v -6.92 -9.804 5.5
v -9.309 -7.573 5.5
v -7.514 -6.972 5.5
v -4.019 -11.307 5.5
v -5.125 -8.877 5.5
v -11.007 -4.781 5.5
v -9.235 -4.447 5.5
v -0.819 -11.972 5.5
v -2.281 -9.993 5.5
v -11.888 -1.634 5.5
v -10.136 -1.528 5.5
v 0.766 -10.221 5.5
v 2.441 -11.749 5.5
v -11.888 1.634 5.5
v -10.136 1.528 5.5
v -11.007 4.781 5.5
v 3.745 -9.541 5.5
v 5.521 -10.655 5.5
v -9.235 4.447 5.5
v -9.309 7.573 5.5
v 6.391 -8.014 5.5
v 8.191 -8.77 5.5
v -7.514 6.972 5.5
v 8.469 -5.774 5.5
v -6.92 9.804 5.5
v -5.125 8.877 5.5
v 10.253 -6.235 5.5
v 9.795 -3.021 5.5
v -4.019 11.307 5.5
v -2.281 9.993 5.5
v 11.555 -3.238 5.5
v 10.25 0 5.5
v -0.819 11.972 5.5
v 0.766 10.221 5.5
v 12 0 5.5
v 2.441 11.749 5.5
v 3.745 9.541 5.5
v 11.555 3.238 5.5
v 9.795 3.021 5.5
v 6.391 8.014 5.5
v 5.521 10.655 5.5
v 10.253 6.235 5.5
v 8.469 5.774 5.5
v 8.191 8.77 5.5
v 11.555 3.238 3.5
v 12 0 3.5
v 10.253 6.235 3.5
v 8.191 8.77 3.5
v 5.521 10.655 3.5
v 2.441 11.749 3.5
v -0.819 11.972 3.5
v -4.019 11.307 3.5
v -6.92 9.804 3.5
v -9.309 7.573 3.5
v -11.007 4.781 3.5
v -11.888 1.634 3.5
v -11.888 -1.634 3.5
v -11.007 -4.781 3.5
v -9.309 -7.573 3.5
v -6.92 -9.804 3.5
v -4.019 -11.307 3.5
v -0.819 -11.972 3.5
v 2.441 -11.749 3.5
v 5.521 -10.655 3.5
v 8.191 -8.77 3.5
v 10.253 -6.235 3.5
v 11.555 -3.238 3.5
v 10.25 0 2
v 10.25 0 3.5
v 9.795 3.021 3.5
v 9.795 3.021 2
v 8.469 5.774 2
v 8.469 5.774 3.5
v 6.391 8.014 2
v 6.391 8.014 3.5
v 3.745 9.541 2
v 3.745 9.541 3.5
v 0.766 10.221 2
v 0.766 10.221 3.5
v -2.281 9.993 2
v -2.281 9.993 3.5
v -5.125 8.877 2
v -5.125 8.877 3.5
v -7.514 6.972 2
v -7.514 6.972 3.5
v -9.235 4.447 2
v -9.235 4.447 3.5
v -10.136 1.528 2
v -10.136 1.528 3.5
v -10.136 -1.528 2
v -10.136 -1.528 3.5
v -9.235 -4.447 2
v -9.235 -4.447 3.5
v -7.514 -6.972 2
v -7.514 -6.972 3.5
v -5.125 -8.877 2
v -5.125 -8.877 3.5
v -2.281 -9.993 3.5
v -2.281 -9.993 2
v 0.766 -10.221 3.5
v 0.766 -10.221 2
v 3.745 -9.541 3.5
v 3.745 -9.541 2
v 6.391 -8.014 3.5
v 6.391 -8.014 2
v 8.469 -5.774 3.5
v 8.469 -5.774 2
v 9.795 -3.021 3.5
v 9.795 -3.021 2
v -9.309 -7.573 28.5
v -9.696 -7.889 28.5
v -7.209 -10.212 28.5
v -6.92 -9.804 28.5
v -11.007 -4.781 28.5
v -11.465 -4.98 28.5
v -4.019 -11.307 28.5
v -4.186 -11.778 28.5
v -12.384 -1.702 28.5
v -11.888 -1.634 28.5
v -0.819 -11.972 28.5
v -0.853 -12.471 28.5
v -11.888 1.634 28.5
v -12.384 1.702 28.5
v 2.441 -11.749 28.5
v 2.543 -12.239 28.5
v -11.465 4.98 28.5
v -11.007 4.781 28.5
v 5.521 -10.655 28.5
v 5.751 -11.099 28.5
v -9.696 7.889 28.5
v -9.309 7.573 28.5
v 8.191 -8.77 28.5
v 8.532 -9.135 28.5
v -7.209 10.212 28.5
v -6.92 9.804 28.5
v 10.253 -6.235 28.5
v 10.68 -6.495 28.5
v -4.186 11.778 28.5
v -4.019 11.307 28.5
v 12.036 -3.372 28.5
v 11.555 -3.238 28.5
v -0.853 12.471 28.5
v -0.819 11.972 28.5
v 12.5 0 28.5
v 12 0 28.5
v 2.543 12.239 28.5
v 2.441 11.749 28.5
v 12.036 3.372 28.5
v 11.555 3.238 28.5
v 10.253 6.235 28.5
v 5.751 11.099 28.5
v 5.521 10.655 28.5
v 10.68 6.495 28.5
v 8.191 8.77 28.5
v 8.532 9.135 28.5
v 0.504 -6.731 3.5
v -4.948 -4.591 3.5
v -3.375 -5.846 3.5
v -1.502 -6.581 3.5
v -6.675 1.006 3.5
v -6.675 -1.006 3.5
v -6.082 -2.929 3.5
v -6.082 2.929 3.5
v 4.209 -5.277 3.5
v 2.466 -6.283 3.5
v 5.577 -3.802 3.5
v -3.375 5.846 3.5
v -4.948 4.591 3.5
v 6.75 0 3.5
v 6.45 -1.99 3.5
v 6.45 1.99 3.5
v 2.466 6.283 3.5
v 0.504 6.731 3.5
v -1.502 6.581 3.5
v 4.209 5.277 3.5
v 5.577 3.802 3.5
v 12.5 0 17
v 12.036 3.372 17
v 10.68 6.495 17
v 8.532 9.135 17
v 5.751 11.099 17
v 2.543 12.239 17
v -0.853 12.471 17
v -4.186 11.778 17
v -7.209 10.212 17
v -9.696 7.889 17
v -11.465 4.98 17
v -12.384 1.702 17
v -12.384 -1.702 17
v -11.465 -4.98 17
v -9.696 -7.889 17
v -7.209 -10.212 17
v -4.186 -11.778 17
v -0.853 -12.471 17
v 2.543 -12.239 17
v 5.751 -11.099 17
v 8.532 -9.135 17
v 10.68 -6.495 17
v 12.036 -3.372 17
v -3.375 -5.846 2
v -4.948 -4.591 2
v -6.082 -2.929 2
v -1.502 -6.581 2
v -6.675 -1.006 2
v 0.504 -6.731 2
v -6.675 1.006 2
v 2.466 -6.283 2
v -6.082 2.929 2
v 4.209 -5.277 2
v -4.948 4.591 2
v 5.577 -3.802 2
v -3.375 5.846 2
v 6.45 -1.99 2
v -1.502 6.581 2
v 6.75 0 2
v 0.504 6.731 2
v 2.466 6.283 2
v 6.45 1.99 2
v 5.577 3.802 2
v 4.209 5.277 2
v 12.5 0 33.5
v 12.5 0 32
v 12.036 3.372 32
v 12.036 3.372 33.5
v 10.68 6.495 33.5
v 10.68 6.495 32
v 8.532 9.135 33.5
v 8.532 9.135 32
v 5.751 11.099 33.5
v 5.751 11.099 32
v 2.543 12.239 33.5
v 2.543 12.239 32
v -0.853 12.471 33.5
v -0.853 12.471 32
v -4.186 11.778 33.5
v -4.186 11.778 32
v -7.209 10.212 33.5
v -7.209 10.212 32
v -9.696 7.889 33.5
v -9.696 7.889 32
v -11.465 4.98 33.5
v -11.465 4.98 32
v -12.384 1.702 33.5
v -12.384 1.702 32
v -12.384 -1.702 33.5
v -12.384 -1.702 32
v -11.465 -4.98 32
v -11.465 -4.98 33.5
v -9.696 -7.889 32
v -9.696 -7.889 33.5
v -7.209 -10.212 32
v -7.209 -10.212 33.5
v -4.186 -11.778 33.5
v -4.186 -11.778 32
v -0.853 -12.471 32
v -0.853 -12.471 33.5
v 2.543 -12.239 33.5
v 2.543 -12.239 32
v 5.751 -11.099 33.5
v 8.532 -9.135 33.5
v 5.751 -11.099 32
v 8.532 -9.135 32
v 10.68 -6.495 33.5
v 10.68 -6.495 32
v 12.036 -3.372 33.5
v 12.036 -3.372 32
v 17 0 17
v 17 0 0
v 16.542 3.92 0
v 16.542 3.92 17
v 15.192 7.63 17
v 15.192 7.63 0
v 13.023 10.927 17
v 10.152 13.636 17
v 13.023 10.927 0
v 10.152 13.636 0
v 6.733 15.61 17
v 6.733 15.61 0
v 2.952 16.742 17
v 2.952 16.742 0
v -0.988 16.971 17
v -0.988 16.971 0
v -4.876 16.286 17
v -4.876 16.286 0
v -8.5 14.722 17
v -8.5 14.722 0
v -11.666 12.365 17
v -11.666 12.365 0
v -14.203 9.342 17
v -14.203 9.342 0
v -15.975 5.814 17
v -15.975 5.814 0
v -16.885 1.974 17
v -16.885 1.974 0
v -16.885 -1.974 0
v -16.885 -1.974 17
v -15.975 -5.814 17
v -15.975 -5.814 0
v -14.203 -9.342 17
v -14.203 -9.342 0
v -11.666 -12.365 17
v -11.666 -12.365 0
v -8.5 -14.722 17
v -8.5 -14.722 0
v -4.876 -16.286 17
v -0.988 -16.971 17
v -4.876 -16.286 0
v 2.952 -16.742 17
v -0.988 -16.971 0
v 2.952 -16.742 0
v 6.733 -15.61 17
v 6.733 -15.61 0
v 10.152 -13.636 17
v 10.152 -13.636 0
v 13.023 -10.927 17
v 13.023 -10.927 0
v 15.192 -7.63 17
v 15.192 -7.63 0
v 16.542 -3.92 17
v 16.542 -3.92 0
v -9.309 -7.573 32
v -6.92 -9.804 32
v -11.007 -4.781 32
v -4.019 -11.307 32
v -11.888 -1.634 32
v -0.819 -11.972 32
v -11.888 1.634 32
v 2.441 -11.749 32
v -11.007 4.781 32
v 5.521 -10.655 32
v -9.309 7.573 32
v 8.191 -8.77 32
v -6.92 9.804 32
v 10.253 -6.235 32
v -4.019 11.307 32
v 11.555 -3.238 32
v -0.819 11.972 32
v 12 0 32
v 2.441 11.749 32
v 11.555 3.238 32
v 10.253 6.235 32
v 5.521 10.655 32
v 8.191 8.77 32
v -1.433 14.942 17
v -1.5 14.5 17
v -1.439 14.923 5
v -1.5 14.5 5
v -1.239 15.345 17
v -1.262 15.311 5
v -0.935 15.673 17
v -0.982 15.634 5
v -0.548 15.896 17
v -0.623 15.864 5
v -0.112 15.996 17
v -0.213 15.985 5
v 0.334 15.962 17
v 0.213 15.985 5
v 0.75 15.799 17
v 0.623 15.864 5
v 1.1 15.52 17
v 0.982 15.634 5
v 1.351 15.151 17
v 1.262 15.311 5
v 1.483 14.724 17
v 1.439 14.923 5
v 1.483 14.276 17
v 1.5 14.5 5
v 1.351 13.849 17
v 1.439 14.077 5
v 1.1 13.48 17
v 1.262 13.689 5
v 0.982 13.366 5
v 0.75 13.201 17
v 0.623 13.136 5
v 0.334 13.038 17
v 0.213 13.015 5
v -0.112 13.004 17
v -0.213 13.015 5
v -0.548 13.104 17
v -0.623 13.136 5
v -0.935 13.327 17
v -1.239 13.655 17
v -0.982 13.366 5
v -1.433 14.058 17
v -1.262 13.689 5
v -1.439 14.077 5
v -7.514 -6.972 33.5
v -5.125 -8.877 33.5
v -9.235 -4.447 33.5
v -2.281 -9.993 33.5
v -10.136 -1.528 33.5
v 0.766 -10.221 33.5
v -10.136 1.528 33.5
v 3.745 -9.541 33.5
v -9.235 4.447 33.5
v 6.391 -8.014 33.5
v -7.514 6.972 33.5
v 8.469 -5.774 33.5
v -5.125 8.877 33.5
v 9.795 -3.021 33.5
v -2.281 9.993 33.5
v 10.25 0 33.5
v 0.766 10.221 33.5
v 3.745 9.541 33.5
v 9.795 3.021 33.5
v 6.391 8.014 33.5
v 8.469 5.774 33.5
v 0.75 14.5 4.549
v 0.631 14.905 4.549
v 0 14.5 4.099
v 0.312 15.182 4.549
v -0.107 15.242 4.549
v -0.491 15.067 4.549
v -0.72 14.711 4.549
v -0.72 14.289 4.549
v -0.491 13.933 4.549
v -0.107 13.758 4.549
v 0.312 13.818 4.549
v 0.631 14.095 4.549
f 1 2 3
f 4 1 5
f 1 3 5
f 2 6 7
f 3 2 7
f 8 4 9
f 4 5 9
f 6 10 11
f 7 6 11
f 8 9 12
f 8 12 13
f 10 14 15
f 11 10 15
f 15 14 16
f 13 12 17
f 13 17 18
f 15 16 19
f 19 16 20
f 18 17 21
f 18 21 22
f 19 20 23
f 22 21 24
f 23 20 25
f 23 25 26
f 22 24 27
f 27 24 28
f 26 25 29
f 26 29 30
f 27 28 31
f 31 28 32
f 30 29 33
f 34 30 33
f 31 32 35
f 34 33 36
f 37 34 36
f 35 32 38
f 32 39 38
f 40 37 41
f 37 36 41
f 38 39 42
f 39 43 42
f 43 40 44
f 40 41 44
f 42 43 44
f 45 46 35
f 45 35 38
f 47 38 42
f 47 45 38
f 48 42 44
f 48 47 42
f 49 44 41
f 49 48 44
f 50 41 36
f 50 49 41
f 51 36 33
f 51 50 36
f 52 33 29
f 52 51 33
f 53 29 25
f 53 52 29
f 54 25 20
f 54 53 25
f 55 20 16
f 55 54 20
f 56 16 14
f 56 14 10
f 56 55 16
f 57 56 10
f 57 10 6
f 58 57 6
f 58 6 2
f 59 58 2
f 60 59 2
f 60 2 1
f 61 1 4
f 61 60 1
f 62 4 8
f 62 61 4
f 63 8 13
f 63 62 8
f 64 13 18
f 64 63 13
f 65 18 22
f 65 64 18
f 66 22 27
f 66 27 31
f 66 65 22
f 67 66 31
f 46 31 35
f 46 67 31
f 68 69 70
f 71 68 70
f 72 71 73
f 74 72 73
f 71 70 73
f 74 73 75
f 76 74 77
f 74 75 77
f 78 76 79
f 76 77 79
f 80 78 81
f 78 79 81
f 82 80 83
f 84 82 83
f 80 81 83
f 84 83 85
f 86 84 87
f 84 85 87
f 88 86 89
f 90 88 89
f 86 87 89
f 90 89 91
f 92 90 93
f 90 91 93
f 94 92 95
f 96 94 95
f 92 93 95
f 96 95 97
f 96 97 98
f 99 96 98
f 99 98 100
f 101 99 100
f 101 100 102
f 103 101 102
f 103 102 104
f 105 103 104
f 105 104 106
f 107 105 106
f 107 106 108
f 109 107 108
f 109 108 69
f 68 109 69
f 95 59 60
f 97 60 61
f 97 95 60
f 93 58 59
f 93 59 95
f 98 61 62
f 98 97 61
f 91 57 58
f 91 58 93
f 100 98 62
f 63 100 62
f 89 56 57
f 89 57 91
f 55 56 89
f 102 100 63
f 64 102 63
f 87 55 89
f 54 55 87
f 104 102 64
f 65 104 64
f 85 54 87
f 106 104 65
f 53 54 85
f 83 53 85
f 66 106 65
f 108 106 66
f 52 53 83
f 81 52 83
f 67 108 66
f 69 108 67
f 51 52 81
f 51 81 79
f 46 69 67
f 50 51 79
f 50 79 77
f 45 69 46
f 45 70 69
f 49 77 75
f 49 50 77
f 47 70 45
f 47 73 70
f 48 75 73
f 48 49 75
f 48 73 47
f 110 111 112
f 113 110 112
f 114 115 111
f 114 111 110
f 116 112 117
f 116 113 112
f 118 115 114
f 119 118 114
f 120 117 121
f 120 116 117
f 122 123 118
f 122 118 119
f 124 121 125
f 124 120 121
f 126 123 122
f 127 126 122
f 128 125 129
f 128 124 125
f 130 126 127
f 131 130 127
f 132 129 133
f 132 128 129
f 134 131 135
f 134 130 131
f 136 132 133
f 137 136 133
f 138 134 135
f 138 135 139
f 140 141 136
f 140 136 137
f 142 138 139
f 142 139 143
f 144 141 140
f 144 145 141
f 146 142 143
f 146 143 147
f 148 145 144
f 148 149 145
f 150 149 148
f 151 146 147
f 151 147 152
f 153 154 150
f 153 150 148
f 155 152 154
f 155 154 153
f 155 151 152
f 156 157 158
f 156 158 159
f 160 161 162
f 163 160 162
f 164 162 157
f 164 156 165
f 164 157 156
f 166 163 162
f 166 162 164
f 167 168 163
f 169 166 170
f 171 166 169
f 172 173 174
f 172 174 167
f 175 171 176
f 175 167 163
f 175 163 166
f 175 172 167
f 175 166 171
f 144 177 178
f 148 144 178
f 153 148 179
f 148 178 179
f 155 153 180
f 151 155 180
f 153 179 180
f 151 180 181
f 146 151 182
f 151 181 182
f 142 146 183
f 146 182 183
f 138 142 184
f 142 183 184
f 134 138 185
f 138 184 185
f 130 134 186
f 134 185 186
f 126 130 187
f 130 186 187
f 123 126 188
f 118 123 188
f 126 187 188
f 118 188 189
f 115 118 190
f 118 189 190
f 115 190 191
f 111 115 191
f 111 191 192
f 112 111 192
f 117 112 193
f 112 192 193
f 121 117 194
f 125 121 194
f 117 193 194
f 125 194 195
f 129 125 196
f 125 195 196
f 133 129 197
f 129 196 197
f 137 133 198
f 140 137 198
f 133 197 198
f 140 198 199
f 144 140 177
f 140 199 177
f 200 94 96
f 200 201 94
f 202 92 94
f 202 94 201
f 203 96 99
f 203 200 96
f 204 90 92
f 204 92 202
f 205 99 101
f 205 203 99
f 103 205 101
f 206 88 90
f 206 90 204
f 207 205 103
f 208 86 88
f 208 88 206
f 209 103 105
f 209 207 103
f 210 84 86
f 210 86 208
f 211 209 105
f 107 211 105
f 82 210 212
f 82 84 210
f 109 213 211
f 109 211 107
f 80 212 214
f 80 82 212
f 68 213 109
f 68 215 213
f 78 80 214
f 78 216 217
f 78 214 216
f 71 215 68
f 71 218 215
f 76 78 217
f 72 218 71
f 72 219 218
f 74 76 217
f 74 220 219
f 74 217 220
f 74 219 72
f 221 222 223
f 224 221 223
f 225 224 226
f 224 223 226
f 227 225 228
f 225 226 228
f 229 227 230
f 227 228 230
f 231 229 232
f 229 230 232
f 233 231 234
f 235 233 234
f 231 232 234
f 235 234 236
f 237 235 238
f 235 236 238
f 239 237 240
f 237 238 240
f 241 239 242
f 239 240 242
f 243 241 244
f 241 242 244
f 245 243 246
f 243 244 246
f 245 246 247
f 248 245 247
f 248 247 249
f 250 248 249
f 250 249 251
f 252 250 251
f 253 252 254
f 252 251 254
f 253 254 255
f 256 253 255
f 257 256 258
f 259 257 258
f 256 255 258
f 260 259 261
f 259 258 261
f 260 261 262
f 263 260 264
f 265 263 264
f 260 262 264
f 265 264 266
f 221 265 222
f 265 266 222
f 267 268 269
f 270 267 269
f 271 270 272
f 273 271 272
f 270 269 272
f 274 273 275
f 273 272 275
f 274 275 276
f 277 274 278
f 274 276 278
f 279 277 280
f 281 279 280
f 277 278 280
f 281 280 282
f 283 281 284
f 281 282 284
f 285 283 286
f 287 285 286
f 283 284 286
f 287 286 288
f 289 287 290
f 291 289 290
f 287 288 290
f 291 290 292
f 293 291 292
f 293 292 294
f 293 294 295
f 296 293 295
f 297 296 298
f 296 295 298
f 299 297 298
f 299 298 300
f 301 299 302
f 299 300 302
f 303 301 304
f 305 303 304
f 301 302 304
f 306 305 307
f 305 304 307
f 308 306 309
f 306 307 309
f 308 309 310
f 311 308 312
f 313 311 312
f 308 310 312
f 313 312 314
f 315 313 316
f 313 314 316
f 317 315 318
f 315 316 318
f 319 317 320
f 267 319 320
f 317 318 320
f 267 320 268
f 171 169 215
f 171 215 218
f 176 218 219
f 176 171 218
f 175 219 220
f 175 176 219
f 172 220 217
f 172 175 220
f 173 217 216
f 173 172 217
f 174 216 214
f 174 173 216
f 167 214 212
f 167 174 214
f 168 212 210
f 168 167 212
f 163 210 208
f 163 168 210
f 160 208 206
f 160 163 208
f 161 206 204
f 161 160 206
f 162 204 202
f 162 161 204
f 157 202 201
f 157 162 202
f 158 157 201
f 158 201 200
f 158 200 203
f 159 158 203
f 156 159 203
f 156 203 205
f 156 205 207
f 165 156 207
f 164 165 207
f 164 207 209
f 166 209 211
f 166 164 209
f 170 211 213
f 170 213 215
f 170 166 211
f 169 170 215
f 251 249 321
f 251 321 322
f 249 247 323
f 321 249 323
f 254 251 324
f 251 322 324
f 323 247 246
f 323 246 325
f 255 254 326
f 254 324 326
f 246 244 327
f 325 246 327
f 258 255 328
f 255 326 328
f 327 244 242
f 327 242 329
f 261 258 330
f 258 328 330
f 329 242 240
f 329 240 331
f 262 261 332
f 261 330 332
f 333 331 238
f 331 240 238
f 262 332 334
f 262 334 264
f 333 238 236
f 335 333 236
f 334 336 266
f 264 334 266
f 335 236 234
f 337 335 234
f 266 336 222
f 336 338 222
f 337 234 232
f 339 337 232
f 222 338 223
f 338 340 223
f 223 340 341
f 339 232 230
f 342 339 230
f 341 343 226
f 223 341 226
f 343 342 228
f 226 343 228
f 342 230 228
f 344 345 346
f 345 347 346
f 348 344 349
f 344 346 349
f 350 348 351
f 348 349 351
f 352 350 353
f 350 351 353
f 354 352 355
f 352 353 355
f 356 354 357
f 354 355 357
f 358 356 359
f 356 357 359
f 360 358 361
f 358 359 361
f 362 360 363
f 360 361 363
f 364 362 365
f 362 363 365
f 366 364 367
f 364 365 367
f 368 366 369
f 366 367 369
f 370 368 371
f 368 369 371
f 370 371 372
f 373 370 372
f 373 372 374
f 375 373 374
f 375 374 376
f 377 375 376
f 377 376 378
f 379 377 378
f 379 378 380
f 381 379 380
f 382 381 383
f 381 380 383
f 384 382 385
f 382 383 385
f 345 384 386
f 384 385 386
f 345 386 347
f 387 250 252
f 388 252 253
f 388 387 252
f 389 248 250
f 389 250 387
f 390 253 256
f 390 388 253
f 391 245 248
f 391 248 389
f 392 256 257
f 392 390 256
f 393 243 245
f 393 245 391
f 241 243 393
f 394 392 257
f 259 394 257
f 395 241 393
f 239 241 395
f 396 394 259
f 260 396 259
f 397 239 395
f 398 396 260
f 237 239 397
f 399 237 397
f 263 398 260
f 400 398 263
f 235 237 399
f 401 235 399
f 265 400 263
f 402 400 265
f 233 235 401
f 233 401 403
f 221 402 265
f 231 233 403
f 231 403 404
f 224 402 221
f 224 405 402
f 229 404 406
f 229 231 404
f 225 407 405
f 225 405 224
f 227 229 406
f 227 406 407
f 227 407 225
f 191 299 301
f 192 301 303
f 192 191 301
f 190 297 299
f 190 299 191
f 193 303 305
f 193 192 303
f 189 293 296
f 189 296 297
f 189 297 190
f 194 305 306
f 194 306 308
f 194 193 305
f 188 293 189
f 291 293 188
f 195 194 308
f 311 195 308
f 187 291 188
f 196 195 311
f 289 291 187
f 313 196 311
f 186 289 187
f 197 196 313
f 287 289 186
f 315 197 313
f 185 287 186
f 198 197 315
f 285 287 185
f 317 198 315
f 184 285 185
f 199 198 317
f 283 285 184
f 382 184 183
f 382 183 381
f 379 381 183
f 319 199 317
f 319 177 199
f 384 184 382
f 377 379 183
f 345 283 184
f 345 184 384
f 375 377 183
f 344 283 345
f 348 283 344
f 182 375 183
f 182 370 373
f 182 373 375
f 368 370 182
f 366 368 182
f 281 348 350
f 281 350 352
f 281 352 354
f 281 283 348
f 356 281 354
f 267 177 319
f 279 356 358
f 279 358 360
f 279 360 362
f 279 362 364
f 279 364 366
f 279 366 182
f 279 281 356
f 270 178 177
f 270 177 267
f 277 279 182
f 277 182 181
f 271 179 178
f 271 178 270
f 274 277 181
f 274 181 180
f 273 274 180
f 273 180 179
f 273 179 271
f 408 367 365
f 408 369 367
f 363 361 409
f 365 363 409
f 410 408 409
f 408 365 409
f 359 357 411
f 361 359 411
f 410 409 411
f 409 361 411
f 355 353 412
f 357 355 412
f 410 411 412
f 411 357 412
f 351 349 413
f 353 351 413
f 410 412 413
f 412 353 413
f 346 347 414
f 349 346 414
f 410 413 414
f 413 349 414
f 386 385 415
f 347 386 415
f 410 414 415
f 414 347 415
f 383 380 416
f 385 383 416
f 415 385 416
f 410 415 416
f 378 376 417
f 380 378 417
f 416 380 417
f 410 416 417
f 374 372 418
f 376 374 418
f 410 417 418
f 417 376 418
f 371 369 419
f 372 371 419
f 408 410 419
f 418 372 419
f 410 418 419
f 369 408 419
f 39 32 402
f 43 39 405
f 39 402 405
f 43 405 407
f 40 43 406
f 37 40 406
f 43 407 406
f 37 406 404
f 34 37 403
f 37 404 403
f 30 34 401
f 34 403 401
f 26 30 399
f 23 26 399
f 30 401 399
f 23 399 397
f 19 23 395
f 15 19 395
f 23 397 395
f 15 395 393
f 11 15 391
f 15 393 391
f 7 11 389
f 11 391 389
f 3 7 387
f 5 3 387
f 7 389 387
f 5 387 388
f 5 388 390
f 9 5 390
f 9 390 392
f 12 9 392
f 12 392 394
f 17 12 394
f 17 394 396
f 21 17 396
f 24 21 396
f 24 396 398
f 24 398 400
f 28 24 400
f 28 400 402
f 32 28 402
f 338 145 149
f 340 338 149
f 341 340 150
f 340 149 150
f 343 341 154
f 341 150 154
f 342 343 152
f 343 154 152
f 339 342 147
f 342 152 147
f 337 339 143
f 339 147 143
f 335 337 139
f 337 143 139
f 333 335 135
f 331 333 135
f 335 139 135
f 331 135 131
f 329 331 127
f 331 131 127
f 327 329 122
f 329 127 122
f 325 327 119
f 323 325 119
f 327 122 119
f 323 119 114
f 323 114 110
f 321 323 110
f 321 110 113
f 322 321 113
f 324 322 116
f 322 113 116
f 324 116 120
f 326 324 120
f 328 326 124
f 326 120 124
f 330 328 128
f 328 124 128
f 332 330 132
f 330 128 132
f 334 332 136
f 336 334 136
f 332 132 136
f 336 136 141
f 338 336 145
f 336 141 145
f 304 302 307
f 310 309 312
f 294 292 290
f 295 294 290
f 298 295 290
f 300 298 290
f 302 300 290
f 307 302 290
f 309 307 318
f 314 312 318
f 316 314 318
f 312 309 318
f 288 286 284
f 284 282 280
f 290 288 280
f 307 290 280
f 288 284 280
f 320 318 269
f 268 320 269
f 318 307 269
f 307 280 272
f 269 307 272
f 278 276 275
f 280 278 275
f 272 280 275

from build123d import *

# Parameters (mm, degrees)
ESQUISSE1_R                       = 17
BOSS_EXTRU_1_DEPTH                = 17
ESQUISSE2_R                       = 12.5
BOSS_EXTRU_2_DEPTH                = 11.5
ESQUISSE3_R                       = 12
BOSS_EXTRU_3_DEPTH                = 3.5
ESQUISSE4_R                       = 12.5
BOSS_EXTRU_4_DEPTH                = 1.5
ESQUISSE5_R                       = 10.25
ENL_V_MAT_EXTRU_1_DEPTH           = 30
ESQUISSE6_R                       = 10.25
ESQUISSE6_R_2                     = 6.75
ENL_V_MAT_EXTRU_2_DEPTH           = 1.5
ESQUISSE7_R                       = 12
ESQUISSE7_R_2                     = 10.25
ENL_V_MAT_EXTRU_3_DEPTH           = 2
DIAM_TRE_DU_PER_AGE_3_0_3_1_D     = 3
DIAM_TRE_DU_PER_AGE_3_0_3_1_DEPTH = 12
DIAM_TRE_DU_PER_AGE_3_0_3_1_TIP   = 0.901290929


with BuildPart() as part:
    # Esquisse1 → Boss.-Extru.1 (new body)
    with BuildSketch(Plane.XY):
        Circle(ESQUISSE1_R)
    extrude(amount=BOSS_EXTRU_1_DEPTH)

    # Esquisse2 → Boss.-Extru.2 (add)
    with BuildSketch(Plane.XY.offset(17)):
        Circle(ESQUISSE2_R)
    extrude(amount=BOSS_EXTRU_2_DEPTH)

    # Esquisse3 → Boss.-Extru.3 (add)
    with BuildSketch(Plane.XY.offset(28.5)):
        Circle(ESQUISSE3_R)
    extrude(amount=BOSS_EXTRU_3_DEPTH)

    # Esquisse4 → Boss.-Extru.4 (add)
    with BuildSketch(Plane.XY.offset(32)):
        Circle(ESQUISSE4_R)
    extrude(amount=BOSS_EXTRU_4_DEPTH)

    # Esquisse5 → Enlèv. mat.-Extru.1 (cut)
    with BuildSketch(Plane.XY.offset(33.5)):
        Circle(ESQUISSE5_R)
    extrude(amount=-ENL_V_MAT_EXTRU_1_DEPTH, mode=Mode.SUBTRACT)

    # Esquisse6 → Enlèv. mat.-Extru.2 (cut)
    with BuildSketch(Plane.XY.offset(3.5)):
        Circle(ESQUISSE6_R)
        Circle(ESQUISSE6_R_2, mode=Mode.SUBTRACT)
    extrude(amount=-ENL_V_MAT_EXTRU_2_DEPTH, mode=Mode.SUBTRACT)

    # Esquisse7 → Enlèv. mat.-Extru.3 (cut)
    with BuildSketch(Plane.XY.offset(3.5)):
        Circle(ESQUISSE7_R)
        Circle(ESQUISSE7_R_2, mode=Mode.SUBTRACT)
    extrude(amount=ENL_V_MAT_EXTRU_3_DEPTH, mode=Mode.SUBTRACT)

    # Diamètre du perçage Ø3.0 (3)1
    with Locations(Plane.XY.offset(17)):
        with Locations((0, 14.5)):
            Hole(DIAM_TRE_DU_PER_AGE_3_0_3_1_D / 2, depth=DIAM_TRE_DU_PER_AGE_3_0_3_1_DEPTH)
            with Locations((0, 0, -(DIAM_TRE_DU_PER_AGE_3_0_3_1_DEPTH + DIAM_TRE_DU_PER_AGE_3_0_3_1_TIP / 2))):  # 118° drill point
                Cone(0, DIAM_TRE_DU_PER_AGE_3_0_3_1_D / 2, DIAM_TRE_DU_PER_AGE_3_0_3_1_TIP, mode=Mode.SUBTRACT)


solid = part.part
